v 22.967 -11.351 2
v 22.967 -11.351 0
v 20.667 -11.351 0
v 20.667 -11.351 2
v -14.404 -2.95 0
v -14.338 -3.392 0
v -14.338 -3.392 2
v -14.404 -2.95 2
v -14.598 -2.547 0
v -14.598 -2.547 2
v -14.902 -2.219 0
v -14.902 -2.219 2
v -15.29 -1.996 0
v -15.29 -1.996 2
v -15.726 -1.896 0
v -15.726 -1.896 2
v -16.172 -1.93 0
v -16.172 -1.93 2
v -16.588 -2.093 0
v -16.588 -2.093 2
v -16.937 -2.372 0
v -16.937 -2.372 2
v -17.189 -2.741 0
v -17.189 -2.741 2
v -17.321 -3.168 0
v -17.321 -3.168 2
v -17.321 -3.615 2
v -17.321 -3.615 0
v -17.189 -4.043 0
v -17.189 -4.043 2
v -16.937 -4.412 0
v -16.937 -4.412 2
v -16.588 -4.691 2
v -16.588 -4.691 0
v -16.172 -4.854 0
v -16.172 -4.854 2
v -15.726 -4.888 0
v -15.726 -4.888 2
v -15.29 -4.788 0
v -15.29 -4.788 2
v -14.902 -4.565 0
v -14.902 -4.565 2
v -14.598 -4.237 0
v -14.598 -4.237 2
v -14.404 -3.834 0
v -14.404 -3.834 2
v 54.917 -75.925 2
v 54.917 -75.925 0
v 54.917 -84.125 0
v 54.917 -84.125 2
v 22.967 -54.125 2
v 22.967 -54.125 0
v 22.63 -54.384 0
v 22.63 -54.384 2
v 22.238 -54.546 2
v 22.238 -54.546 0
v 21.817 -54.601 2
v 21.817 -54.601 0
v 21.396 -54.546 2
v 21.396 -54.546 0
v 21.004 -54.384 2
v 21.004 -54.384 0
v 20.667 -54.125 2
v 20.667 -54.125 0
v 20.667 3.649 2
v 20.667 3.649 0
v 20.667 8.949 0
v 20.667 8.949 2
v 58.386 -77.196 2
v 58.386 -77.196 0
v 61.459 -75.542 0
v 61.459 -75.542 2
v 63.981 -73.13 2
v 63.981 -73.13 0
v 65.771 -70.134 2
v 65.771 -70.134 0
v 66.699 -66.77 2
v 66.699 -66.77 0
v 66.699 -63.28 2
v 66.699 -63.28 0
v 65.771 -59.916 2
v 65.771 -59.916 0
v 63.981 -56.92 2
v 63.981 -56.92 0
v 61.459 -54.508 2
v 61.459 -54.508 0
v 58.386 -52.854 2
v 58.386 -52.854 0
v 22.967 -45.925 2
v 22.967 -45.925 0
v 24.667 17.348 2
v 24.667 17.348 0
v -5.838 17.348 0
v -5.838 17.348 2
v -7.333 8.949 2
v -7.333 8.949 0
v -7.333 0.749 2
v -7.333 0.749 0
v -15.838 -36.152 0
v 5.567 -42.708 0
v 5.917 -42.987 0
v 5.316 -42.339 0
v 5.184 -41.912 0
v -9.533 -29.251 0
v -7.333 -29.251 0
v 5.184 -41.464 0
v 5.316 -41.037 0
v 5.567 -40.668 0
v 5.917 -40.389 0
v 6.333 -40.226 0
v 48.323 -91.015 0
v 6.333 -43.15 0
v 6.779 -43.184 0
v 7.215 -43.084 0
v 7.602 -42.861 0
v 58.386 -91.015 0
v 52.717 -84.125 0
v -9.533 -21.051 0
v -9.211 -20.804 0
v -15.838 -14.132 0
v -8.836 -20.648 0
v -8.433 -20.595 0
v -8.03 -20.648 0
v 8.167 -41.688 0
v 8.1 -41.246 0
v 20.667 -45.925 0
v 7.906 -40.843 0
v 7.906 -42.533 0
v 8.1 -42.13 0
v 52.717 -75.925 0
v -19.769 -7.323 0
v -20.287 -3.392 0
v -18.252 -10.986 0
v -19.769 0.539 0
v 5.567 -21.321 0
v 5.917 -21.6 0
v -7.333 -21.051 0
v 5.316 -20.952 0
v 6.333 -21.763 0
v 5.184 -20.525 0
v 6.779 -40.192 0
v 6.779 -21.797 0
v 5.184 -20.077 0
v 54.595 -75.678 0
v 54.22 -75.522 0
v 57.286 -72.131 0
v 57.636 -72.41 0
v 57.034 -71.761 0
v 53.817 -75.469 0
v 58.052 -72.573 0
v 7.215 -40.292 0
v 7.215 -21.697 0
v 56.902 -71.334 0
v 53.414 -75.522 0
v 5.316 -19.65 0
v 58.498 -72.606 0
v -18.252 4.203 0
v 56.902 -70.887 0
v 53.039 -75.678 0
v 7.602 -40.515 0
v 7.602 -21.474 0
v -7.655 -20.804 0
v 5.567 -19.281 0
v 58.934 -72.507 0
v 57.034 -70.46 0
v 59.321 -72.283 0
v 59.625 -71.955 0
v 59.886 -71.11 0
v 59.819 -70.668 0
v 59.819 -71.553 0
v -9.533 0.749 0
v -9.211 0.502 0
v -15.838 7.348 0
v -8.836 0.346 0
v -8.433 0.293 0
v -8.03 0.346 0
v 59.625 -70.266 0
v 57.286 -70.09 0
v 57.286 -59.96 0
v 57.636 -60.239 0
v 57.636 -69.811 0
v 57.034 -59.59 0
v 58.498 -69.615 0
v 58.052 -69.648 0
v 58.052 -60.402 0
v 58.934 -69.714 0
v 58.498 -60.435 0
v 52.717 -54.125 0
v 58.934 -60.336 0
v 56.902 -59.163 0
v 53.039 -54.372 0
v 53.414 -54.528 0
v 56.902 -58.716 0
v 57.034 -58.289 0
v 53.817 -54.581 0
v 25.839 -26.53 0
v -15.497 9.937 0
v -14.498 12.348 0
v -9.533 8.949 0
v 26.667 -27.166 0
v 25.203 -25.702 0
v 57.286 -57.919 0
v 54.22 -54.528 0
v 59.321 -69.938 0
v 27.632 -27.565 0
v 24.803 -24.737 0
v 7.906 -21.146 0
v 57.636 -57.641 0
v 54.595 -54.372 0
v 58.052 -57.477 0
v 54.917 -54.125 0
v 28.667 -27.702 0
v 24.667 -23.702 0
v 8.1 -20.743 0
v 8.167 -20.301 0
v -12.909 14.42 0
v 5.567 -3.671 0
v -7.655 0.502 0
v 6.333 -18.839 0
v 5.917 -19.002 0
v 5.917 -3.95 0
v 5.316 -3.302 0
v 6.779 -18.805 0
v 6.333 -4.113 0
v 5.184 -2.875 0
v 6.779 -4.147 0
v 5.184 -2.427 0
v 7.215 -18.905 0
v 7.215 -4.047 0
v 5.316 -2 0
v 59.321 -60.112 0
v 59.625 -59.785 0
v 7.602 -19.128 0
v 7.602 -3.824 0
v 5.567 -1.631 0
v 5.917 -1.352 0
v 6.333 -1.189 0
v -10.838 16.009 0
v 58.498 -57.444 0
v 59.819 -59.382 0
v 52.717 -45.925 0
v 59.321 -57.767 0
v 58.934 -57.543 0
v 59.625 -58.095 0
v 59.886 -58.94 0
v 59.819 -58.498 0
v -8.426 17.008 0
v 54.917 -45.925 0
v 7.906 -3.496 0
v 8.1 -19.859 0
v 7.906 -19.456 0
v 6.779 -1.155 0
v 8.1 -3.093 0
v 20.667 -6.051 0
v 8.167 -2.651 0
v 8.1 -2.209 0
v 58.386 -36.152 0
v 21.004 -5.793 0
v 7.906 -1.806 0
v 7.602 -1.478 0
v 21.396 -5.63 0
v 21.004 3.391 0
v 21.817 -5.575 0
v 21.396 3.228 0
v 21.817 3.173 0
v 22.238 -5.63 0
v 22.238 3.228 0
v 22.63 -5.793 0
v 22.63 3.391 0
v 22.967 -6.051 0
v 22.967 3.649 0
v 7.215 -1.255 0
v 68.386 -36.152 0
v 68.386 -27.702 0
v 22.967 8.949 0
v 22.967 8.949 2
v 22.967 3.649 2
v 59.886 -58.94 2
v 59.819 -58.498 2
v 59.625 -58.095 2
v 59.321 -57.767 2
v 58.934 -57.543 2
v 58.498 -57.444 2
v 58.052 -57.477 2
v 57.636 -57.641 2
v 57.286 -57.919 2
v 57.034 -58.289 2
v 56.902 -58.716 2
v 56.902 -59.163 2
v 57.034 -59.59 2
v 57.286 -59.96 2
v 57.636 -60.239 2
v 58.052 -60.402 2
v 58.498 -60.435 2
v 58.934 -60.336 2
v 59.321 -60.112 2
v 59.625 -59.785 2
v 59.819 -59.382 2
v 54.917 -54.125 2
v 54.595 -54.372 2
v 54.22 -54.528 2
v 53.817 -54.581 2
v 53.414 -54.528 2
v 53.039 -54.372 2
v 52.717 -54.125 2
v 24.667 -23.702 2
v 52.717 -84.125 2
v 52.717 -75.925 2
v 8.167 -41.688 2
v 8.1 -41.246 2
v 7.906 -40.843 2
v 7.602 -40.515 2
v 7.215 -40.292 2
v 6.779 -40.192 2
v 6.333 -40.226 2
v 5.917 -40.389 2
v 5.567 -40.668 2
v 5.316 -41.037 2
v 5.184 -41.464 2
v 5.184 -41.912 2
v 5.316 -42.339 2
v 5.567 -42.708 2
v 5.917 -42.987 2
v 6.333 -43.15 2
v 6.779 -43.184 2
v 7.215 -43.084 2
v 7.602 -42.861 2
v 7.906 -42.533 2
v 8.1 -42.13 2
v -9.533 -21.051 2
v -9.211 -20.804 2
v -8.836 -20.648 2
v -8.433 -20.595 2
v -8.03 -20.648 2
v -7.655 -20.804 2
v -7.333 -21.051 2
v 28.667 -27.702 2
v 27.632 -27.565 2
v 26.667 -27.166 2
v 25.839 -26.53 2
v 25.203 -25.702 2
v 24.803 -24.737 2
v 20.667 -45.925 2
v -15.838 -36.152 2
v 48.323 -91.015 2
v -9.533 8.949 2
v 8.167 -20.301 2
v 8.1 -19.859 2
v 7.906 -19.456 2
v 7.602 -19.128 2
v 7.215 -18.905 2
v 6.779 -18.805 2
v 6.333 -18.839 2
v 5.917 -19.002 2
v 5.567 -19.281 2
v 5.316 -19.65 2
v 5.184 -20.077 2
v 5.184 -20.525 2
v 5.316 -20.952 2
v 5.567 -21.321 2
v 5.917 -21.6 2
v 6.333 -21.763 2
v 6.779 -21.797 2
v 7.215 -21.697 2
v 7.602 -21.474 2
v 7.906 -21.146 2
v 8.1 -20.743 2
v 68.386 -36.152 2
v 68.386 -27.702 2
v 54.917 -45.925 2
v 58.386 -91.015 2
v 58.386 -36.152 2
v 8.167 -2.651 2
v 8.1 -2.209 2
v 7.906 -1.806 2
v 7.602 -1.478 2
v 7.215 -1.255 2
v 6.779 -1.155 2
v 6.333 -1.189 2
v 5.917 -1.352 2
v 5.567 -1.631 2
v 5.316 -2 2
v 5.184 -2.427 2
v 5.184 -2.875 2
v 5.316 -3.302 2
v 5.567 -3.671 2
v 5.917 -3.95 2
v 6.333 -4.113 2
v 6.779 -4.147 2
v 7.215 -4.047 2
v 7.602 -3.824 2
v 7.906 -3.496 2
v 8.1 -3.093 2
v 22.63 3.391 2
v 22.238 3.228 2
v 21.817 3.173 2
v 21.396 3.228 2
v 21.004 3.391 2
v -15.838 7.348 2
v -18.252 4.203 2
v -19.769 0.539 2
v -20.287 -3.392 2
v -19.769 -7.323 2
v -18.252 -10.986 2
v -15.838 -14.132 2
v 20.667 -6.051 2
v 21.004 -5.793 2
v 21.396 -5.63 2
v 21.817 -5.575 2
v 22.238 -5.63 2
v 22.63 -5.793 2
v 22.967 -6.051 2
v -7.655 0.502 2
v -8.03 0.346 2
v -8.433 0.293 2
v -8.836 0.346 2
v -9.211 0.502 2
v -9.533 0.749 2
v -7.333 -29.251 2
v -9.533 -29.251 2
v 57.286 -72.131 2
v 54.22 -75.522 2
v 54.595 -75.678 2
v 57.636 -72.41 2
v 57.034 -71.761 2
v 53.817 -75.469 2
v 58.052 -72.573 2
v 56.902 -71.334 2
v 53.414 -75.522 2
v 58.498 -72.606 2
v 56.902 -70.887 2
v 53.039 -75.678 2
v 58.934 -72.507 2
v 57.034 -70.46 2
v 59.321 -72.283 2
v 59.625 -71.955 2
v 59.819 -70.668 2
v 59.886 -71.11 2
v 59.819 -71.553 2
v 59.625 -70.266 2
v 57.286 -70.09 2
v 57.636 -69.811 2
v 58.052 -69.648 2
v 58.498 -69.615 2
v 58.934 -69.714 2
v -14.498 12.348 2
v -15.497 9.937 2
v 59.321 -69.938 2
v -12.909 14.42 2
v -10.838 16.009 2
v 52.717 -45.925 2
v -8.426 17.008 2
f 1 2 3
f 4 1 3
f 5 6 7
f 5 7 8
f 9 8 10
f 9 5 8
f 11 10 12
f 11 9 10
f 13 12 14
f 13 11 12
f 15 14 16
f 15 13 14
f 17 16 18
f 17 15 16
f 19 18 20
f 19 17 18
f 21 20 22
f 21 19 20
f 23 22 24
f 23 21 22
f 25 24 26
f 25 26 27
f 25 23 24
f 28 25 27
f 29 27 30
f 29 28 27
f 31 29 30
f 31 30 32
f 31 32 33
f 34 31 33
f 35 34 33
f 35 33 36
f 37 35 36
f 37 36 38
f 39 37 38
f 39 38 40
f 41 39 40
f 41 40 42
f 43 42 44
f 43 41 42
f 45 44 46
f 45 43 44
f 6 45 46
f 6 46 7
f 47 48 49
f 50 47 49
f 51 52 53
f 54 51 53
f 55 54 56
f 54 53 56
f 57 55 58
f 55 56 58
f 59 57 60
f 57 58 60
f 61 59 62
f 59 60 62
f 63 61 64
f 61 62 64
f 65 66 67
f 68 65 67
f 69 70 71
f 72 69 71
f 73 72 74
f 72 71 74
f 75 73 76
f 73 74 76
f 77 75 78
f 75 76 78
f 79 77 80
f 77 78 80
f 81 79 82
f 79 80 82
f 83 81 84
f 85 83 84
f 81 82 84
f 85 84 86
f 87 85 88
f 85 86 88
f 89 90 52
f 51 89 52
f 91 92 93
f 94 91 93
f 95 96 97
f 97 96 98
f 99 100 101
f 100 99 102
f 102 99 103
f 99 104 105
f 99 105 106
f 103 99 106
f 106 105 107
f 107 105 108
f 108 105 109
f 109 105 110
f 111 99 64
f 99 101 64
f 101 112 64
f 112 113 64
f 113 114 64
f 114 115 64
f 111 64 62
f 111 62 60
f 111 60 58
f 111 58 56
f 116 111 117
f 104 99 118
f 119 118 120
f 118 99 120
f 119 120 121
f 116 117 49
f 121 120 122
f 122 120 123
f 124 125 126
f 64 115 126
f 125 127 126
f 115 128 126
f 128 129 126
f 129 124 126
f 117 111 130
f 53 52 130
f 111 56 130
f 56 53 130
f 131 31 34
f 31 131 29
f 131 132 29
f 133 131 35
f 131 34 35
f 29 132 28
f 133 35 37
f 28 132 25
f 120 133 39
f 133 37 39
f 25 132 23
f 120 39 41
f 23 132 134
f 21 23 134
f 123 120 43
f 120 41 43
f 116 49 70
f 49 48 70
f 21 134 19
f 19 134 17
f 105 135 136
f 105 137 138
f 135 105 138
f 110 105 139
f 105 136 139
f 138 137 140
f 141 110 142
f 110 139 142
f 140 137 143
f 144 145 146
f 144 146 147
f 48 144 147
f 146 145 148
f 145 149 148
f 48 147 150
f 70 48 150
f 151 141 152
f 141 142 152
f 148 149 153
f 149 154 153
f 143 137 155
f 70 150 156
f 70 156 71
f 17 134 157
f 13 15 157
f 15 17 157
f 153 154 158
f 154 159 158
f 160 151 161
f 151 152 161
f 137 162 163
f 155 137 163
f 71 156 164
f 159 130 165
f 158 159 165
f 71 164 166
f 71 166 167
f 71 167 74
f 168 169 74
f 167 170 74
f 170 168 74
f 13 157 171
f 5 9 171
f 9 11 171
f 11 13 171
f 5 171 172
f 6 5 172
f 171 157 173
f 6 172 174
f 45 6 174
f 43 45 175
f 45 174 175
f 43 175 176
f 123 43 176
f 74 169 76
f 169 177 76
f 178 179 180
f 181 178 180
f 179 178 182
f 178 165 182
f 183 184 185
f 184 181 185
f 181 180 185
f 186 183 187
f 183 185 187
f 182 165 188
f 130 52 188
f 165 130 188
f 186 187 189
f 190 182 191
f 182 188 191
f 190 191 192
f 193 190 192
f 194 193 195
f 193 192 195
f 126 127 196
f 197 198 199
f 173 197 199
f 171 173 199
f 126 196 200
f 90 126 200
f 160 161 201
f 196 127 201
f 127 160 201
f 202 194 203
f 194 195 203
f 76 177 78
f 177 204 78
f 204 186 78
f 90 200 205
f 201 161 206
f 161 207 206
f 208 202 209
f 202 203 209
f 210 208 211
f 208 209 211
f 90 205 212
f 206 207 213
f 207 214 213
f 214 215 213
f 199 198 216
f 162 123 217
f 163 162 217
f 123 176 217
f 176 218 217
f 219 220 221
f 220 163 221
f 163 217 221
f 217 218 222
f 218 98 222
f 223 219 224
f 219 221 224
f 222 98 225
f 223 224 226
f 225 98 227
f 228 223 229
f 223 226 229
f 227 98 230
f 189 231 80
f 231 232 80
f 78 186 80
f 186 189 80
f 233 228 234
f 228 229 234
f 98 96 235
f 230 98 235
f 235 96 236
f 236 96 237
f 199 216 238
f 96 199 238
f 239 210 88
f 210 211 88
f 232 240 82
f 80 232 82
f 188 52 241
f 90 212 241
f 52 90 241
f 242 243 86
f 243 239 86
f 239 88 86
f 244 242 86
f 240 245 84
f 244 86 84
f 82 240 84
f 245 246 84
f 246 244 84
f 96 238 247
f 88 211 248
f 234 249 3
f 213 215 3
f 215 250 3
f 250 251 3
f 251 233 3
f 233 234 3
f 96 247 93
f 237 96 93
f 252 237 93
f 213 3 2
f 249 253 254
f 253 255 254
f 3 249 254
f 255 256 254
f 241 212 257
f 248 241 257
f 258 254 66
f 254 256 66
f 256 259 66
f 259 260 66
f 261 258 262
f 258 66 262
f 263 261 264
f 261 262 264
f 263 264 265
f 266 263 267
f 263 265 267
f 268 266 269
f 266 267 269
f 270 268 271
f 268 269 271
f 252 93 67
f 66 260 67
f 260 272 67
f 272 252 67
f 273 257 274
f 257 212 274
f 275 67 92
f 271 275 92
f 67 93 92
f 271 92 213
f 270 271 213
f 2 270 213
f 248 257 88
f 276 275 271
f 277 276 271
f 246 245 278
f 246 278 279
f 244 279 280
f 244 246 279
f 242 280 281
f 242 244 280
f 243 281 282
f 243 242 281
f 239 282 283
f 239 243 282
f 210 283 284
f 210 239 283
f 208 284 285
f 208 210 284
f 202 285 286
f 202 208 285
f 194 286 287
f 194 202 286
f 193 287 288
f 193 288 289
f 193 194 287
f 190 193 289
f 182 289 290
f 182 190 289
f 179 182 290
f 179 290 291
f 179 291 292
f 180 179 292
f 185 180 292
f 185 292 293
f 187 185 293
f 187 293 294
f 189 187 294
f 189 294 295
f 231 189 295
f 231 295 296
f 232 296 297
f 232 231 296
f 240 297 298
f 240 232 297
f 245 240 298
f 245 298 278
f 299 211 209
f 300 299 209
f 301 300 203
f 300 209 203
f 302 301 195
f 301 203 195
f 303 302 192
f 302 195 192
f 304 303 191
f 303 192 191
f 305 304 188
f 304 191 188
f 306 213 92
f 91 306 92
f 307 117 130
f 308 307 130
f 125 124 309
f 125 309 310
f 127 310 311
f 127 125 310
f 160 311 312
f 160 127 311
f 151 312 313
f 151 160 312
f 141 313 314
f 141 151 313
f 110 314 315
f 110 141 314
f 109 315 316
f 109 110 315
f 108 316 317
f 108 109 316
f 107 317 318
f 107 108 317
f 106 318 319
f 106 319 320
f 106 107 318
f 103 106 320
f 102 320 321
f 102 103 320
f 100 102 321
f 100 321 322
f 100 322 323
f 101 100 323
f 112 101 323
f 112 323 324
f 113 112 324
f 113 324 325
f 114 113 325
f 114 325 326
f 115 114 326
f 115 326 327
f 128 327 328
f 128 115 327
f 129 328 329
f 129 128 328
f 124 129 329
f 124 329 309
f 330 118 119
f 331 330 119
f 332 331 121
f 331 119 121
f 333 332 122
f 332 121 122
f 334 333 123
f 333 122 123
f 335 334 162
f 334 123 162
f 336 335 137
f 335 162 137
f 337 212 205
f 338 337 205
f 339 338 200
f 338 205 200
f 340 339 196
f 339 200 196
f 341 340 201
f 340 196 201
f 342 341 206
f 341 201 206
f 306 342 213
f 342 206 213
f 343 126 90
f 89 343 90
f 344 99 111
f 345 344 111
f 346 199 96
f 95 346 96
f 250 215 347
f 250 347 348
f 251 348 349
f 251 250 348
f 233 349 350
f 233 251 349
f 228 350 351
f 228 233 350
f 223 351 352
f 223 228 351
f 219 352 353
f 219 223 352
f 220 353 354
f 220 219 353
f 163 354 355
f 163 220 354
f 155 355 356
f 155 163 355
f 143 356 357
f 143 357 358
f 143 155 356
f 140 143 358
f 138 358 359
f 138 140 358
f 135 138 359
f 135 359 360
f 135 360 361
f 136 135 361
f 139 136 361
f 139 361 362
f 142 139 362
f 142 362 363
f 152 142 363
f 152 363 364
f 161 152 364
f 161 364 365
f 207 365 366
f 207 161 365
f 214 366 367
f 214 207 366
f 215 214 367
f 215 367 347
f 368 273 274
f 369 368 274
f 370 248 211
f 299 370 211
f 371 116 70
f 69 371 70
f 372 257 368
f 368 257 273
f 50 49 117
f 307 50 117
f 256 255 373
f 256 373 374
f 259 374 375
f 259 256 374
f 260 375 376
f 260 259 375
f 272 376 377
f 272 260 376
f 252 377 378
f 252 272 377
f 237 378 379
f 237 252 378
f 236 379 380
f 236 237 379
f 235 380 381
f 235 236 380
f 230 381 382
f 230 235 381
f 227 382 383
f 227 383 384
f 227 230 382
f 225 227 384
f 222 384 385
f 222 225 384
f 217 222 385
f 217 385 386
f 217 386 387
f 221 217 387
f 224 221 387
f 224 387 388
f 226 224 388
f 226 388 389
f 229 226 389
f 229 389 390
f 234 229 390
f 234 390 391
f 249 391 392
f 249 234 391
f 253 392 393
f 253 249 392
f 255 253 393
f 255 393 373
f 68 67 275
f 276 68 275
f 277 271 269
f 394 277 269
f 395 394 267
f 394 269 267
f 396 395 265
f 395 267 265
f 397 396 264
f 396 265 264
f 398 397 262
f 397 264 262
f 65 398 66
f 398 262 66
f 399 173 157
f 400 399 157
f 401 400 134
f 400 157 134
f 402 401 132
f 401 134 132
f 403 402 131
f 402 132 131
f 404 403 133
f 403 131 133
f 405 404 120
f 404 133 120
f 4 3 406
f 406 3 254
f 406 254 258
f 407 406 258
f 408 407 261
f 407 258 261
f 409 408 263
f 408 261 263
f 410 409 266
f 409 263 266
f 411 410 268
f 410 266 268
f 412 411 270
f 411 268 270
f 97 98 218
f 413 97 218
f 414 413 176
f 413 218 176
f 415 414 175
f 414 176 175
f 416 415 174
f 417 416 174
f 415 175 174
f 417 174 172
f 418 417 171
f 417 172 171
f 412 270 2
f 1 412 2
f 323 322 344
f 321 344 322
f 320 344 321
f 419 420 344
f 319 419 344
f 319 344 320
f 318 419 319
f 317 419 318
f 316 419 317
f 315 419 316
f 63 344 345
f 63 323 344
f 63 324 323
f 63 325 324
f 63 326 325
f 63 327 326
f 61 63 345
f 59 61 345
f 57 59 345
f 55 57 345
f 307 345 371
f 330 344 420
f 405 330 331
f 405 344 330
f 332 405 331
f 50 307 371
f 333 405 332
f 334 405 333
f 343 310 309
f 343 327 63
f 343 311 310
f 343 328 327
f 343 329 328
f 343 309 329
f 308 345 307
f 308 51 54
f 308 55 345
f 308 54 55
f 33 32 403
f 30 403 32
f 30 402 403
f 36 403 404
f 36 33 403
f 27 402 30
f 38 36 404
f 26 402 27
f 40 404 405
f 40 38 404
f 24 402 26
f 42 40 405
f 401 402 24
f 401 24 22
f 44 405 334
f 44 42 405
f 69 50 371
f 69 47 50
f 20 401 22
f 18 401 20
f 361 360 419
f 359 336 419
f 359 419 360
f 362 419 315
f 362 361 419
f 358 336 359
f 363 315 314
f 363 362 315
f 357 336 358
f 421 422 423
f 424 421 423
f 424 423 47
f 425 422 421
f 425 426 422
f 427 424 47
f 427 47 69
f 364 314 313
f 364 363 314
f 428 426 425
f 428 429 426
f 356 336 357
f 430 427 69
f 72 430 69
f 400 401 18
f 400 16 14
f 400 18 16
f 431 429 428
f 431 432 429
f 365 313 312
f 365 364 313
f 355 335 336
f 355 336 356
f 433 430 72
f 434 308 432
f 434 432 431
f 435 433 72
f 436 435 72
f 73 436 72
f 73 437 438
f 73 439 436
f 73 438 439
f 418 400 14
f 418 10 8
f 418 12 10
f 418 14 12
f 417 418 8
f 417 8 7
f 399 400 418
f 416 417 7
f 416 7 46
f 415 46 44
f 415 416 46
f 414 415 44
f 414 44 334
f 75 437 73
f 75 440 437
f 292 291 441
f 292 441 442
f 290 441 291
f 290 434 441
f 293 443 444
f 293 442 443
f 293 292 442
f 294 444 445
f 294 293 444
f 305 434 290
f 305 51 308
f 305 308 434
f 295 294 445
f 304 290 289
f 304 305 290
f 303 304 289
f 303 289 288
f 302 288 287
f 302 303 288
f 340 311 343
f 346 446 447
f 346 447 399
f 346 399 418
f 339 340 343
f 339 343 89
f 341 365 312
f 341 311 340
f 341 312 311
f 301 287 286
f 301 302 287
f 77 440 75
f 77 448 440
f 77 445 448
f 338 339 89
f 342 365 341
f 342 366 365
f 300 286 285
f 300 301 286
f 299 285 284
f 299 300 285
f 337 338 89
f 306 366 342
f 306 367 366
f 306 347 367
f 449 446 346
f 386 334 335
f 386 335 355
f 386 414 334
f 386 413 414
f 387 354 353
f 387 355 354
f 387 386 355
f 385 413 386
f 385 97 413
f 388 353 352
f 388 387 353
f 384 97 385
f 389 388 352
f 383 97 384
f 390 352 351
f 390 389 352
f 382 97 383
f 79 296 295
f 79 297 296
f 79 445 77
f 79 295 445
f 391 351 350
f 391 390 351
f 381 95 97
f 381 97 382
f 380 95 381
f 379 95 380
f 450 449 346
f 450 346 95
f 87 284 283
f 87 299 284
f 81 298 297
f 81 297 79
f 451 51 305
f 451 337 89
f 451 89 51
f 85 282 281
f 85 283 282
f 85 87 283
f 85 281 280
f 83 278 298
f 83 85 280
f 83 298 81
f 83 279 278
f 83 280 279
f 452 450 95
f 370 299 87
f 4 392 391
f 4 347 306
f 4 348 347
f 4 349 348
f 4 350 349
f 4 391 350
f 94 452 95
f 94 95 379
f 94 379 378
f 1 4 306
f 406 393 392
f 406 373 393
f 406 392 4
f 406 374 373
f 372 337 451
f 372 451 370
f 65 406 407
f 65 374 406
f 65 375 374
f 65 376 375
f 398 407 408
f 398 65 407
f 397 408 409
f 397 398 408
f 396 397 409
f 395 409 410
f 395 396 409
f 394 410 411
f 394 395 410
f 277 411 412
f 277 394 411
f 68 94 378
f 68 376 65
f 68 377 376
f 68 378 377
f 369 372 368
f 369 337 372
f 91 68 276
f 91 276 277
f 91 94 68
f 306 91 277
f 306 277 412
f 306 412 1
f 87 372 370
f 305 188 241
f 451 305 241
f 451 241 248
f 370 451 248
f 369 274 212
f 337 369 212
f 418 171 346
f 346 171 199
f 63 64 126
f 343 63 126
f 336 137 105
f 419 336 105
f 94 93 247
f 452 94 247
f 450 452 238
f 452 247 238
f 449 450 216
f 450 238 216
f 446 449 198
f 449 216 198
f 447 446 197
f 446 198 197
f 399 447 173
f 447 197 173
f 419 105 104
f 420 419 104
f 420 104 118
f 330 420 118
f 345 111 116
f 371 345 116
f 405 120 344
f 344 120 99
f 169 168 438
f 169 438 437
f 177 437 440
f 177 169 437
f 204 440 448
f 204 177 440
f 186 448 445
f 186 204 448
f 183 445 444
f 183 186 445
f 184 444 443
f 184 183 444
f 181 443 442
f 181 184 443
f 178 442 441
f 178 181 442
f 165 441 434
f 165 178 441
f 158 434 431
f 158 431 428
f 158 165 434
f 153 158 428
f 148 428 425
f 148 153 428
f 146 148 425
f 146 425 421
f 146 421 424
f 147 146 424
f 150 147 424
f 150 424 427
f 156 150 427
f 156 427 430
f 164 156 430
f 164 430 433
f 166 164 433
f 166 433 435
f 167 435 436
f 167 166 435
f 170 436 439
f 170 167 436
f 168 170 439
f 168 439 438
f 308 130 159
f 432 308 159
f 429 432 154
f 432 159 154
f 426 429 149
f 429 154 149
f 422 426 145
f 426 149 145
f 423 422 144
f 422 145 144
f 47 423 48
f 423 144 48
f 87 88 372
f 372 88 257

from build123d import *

# Parameters (mm, degrees)
SKETCH_1_R      = 1.5
EXTRUDE_1_DEPTH = 2


with BuildPart() as part:
    # 草图1 → 凸台-拉伸1 (new body)
    with BuildSketch(Plane.XY):
        with BuildLine():
            Line((24.667061038, -23.701524127), (24.667061038, 17.348475873))
            Line((24.667061038, 17.348475873), (-5.837728854, 17.348475873))
            ThreePointArc((-5.837728854, 17.348475873), (-12.908796666, 14.419543685), (-15.837728854, 7.348475873))
            ThreePointArc((-15.837728854, 7.348475873), (-20.286537867, -3.391899182), (-15.837728854, -14.132274238))
            Line((-15.837728854, -14.132274238), (-15.837728854, -36.151614729))
            Line((-15.837728854, -36.151614729), (48.322917805, -91.01542846))
            Line((48.322917805, -91.01542846), (58.385554114, -91.01542846))
            Line((58.385554114, -91.01542846), (58.385554114, -77.195903488))
            ThreePointArc((58.385554114, -77.195903488), (66.817061038, -65.025083014), (58.385554114, -52.85426254))
            Line((58.385554114, -52.85426254), (58.385554114, -41.837165292))
            Line((58.385554114, -41.837165292), (58.385554114, -36.151614729))
            Line((58.385554114, -36.151614729), (68.385554114, -36.151614729))
            Line((68.385554114, -36.151614729), (68.385554114, -27.701524127))
            Line((68.385554114, -27.701524127), (58.385554114, -27.701524127))
            Line((58.385554114, -27.701524127), (28.667061038, -27.701524127))
            ThreePointArc((28.667061038, -27.701524127), (25.838633913, -26.529951252), (24.667061038, -23.701524127))
        make_face()
        with Locations((6.667061038, -41.688027493)):
            Circle(SKETCH_1_R, mode=Mode.SUBTRACT)
        with BuildLine():
            Line((20.667061038, -54.125083014), (20.667061038, -45.925083014))
            Line((20.667061038, -45.925083014), (22.967061038, -45.925083014))
            Line((22.967061038, -45.925083014), (22.967061038, -54.125083014))
            ThreePointArc((22.967061038, -54.125083014), (21.817061038, -54.601428611), (20.667061038, -54.125083014))
        make_face(mode=Mode.SUBTRACT)
        with BuildLine():
            Line((52.717061038, -84.125083014), (52.717061038, -75.925083014))
            ThreePointArc((52.717061038, -75.925083014), (53.817061038, -75.469448095), (54.917061038, -75.925083014))
            Line((54.917061038, -75.925083014), (54.917061038, -84.125083014))
            Line((54.917061038, -84.125083014), (52.717061038, -84.125083014))
        make_face(mode=Mode.SUBTRACT)
        with Locations((58.385554114, -71.110493251)):
            Circle(SKETCH_1_R, mode=Mode.SUBTRACT)
        with Locations((58.385554114, -58.939672777)):
            Circle(SKETCH_1_R, mode=Mode.SUBTRACT)
        with BuildLine():
            Line((52.717061038, -54.125083014), (52.717061038, -45.925083014))
            Line((52.717061038, -45.925083014), (54.917061038, -45.925083014))
            Line((54.917061038, -45.925083014), (54.917061038, -54.125083014))
            ThreePointArc((54.917061038, -54.125083014), (53.817061038, -54.580717932), (52.717061038, -54.125083014))
        make_face(mode=Mode.SUBTRACT)
        with BuildLine():
            Line((-9.532938962, -29.250971973), (-9.532938962, -21.050971973))
            ThreePointArc((-9.532938962, -21.050971973), (-8.432938962, -20.595337054), (-7.332938962, -21.050971973))
            Line((-7.332938962, -21.050971973), (-7.332938962, -29.250971973))
            Line((-7.332938962, -29.250971973), (-9.532938962, -29.250971973))
        make_face(mode=Mode.SUBTRACT)
        with Locations((6.667061038, -20.300971973)):
            Circle(SKETCH_1_R, mode=Mode.SUBTRACT)
        with Locations((-15.837728854, -3.391899182)):
            Circle(SKETCH_1_R, mode=Mode.SUBTRACT)
        with BuildLine():
            Line((-9.532938962, 0.749028027), (-9.532938962, 8.949028027))
            Line((-9.532938962, 8.949028027), (-7.332938962, 8.949028027))
            Line((-7.332938962, 8.949028027), (-7.332938962, 0.749028027))
            ThreePointArc((-7.332938962, 0.749028027), (-8.432938962, 0.293393109), (-9.532938962, 0.749028027))
        make_face(mode=Mode.SUBTRACT)
        with Locations((6.667061038, -2.650971973)):
            Circle(SKETCH_1_R, mode=Mode.SUBTRACT)
        with BuildLine():
            Line((20.667061038, -11.350971973), (20.667061038, -6.050971973))
            ThreePointArc((20.667061038, -6.050971973), (21.817061038, -5.574626376), (22.967061038, -6.050971973))
            Line((22.967061038, -6.050971973), (22.967061038, -11.350971973))
            Line((22.967061038, -11.350971973), (20.667061038, -11.350971973))
        make_face(mode=Mode.SUBTRACT)
        with BuildLine():
            Line((20.667061038, 3.649028027), (20.667061038, 8.949028027))
            Line((20.667061038, 8.949028027), (22.967061038, 8.949028027))
            Line((22.967061038, 8.949028027), (22.967061038, 3.649028027))
            ThreePointArc((22.967061038, 3.649028027), (21.817061038, 3.172682431), (20.667061038, 3.649028027))
        make_face(mode=Mode.SUBTRACT)
    extrude(amount=EXTRUDE_1_DEPTH)


solid = part.part
